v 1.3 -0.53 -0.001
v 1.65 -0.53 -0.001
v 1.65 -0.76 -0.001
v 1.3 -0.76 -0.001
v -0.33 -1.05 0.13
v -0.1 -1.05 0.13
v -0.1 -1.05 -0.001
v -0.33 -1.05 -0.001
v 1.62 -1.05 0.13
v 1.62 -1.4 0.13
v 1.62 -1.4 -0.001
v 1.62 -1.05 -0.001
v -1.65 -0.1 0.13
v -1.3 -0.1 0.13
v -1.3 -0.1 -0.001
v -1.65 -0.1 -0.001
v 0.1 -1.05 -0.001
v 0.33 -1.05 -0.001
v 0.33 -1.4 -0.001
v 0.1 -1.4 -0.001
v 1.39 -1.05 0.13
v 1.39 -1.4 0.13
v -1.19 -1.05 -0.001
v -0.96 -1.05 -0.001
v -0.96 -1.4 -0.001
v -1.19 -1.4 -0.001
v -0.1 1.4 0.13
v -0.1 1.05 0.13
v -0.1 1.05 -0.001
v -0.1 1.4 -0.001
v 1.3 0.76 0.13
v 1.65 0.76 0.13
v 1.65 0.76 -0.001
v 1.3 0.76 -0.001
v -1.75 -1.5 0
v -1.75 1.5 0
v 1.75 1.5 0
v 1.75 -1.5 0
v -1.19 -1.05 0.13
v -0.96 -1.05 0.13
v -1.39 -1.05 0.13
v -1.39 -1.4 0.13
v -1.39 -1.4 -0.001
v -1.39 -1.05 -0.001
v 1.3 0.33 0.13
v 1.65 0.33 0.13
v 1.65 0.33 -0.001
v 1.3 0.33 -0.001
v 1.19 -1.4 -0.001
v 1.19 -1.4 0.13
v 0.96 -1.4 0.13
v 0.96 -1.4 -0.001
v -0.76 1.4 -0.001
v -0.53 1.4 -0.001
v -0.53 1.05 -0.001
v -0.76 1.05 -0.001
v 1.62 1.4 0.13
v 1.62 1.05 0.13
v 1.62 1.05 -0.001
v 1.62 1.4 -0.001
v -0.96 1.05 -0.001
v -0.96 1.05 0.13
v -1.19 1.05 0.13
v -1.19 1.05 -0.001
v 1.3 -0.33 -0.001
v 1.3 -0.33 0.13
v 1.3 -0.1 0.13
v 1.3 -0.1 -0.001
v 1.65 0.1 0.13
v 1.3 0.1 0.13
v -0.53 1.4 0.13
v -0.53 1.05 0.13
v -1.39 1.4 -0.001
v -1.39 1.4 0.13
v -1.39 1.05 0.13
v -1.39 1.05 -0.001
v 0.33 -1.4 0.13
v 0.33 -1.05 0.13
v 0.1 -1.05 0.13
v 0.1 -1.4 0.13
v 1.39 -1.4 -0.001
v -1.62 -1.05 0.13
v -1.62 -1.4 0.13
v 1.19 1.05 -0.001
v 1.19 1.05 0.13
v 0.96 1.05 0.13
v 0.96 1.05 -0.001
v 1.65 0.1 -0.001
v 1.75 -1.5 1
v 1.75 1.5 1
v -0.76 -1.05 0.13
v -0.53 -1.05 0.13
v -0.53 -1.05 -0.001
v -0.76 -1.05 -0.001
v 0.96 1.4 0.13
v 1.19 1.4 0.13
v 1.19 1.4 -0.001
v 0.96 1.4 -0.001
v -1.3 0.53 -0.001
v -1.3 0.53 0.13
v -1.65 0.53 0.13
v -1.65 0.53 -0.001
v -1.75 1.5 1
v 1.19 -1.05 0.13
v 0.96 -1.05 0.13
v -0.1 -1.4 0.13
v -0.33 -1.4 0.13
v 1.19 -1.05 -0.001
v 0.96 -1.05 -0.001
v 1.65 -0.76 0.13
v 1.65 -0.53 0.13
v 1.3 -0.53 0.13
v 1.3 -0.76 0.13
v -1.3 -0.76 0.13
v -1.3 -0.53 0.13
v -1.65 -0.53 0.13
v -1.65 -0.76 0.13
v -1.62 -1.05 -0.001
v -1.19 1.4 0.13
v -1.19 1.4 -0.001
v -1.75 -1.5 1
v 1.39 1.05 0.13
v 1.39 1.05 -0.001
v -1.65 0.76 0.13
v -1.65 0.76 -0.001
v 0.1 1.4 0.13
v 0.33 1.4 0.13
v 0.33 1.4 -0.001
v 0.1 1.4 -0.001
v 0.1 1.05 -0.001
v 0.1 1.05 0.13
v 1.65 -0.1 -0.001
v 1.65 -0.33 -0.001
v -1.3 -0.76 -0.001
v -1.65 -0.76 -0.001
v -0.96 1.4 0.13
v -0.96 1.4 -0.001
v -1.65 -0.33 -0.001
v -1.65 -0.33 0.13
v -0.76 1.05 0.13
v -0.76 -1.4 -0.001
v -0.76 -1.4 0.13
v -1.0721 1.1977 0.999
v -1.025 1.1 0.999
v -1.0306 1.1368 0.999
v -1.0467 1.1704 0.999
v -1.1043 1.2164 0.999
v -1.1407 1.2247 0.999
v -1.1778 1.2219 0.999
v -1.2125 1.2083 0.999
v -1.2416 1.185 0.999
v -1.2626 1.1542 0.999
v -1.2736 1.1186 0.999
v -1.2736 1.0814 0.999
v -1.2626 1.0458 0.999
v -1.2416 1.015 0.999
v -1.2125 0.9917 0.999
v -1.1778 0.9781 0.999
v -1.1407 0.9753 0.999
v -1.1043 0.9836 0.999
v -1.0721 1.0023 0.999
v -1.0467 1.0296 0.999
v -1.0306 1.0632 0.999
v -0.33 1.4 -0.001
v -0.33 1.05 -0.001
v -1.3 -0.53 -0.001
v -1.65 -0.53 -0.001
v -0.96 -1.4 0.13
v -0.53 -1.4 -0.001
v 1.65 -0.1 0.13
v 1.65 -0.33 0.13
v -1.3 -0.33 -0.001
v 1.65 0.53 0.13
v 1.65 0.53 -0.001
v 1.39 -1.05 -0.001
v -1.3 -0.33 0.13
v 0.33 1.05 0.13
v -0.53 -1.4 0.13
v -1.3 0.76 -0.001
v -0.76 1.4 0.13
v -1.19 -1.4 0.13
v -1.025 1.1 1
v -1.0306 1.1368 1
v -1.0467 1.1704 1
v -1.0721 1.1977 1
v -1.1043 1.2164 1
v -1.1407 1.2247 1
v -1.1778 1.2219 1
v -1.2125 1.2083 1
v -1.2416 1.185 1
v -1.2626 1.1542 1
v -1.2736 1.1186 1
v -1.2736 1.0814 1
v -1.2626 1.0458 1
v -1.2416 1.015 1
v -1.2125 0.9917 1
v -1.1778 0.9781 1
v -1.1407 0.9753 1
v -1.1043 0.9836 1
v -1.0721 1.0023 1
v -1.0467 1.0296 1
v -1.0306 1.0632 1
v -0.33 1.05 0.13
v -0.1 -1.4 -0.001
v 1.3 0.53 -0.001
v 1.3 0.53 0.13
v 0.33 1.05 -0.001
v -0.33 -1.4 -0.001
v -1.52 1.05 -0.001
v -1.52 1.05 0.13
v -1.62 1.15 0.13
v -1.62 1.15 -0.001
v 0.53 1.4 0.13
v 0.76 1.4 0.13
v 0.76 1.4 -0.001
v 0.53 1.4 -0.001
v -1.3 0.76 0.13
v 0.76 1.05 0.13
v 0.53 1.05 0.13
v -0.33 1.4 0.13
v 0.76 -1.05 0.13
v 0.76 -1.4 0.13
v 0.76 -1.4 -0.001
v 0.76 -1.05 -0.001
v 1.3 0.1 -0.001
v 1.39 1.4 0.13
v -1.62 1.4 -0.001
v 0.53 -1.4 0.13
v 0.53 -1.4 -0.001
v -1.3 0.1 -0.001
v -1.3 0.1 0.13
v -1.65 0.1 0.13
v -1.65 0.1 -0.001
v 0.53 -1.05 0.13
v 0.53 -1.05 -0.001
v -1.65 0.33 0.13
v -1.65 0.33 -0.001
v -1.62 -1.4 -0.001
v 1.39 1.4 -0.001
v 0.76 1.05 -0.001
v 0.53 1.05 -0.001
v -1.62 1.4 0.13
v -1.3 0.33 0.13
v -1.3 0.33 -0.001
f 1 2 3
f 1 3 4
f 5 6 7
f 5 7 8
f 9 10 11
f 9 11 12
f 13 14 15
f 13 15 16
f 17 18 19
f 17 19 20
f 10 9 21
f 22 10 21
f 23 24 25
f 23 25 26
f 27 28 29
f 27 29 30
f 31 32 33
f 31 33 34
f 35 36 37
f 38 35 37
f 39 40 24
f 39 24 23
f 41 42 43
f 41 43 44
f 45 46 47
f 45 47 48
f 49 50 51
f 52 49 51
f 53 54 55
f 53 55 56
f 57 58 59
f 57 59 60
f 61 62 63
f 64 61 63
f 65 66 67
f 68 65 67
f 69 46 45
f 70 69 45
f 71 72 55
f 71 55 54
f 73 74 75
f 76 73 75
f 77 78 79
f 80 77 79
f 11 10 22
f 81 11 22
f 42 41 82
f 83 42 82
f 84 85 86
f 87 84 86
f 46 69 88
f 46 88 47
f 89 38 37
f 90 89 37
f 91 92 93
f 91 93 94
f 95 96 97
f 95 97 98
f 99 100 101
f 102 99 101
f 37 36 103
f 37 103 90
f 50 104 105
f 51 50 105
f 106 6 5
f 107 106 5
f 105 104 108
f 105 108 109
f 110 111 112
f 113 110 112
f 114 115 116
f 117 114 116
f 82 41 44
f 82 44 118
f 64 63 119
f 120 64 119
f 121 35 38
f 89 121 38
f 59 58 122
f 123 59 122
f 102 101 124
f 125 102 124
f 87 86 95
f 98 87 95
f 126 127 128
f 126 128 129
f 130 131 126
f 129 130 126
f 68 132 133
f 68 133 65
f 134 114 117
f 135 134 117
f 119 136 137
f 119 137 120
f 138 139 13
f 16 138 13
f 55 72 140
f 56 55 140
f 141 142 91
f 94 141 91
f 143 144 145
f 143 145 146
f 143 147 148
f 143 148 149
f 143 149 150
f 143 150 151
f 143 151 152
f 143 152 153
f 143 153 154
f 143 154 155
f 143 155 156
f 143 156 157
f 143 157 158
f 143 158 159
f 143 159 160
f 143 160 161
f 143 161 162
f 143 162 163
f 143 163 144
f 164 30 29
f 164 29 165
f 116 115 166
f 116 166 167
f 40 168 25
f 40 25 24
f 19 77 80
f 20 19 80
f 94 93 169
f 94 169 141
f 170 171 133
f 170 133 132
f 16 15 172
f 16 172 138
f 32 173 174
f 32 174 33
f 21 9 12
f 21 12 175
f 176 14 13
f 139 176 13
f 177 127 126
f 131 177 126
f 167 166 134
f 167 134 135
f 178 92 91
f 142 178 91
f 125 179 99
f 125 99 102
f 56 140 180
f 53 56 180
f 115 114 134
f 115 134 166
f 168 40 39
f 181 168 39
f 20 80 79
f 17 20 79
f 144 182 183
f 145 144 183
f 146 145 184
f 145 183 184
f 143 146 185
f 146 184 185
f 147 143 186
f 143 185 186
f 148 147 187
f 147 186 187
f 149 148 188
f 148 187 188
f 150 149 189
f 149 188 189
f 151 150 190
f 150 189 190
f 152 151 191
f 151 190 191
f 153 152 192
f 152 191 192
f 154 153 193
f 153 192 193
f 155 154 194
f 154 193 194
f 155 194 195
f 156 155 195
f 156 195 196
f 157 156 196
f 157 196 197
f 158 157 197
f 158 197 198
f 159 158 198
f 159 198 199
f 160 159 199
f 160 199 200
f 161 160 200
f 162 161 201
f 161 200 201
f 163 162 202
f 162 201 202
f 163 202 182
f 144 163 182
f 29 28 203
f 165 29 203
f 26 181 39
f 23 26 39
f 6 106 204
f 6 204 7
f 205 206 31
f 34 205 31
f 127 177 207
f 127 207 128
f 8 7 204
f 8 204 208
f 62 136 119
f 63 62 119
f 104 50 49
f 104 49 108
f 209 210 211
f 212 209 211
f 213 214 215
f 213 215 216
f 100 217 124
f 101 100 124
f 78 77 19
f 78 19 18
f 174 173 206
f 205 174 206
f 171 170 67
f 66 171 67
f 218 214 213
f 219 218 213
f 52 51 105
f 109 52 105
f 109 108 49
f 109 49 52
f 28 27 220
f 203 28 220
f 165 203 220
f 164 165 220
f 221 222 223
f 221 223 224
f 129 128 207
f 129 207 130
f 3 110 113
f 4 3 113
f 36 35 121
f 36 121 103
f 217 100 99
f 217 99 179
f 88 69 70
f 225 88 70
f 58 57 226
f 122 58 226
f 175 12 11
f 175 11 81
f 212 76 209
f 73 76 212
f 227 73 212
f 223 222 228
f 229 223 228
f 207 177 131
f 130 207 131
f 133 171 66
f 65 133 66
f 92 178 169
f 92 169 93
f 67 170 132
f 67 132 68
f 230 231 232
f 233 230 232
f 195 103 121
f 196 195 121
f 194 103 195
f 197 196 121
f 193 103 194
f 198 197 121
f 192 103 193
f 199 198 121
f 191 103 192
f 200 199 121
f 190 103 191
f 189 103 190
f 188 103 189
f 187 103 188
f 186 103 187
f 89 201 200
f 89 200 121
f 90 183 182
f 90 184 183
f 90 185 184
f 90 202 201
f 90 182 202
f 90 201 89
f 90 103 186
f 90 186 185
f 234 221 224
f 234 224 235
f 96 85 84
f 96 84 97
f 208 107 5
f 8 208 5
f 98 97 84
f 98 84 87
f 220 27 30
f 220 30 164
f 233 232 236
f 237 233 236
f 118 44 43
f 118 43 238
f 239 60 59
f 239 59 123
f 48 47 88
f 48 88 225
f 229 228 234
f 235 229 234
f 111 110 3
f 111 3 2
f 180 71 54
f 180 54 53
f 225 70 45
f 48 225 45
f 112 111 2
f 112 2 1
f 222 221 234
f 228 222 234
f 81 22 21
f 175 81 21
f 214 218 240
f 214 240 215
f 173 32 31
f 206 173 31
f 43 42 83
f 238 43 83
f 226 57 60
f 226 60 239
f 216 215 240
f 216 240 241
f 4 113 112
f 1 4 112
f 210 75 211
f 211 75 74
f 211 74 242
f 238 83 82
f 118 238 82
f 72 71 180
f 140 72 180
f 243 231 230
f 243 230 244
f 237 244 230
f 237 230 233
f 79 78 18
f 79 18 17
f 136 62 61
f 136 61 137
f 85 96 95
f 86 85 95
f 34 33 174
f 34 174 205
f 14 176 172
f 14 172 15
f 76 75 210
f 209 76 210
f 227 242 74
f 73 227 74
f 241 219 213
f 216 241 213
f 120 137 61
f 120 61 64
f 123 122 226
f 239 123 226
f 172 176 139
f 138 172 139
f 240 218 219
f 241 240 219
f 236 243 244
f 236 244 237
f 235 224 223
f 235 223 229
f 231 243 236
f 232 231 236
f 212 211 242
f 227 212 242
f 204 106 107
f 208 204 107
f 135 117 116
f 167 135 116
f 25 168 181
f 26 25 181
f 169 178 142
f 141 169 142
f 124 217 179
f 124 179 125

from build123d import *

# Parameters (mm, degrees)
SKETCH1_W                   = 3.5
SKETCH1_H                   = 3
BOSS_EXTRUDE1_DEPTH         = 1
BOSS_EXTRUDE2_DEPTH         = 0.001
BOSS_EXTRUDE2_DEPTH_BACK    = 0.13
SKETCH2_W                   = 0.23
SKETCH2_H                   = 0.35
BOSS_EXTRUDE2_2_DEPTH       = 0.001
BOSS_EXTRUDE2_2_DEPTH_BACK  = 0.13
BOSS_EXTRUDE2_3_DEPTH       = 0.001
BOSS_EXTRUDE2_3_DEPTH_BACK  = 0.13
BOSS_EXTRUDE2_4_DEPTH       = 0.001
BOSS_EXTRUDE2_4_DEPTH_BACK  = 0.13
BOSS_EXTRUDE2_5_DEPTH       = 0.001
BOSS_EXTRUDE2_5_DEPTH_BACK  = 0.13
BOSS_EXTRUDE2_6_DEPTH       = 0.001
BOSS_EXTRUDE2_6_DEPTH_BACK  = 0.13
BOSS_EXTRUDE2_7_DEPTH       = 0.001
BOSS_EXTRUDE2_7_DEPTH_BACK  = 0.13
BOSS_EXTRUDE2_8_DEPTH       = 0.001
BOSS_EXTRUDE2_8_DEPTH_BACK  = 0.13
BOSS_EXTRUDE2_9_DEPTH       = 0.001
BOSS_EXTRUDE2_9_DEPTH_BACK  = 0.13
BOSS_EXTRUDE2_10_DEPTH      = 0.001
BOSS_EXTRUDE2_10_DEPTH_BACK = 0.13
BOSS_EXTRUDE2_11_DEPTH      = 0.001
BOSS_EXTRUDE2_11_DEPTH_BACK = 0.13
BOSS_EXTRUDE2_12_DEPTH      = 0.001
BOSS_EXTRUDE2_12_DEPTH_BACK = 0.13
BOSS_EXTRUDE2_13_DEPTH      = 0.001
BOSS_EXTRUDE2_13_DEPTH_BACK = 0.13
BOSS_EXTRUDE2_14_DEPTH      = 0.001
BOSS_EXTRUDE2_14_DEPTH_BACK = 0.13
BOSS_EXTRUDE2_15_DEPTH      = 0.001
BOSS_EXTRUDE2_15_DEPTH_BACK = 0.13
BOSS_EXTRUDE2_16_DEPTH      = 0.001
BOSS_EXTRUDE2_16_DEPTH_BACK = 0.13
BOSS_EXTRUDE2_17_DEPTH      = 0.001
BOSS_EXTRUDE2_17_DEPTH_BACK = 0.13
SKETCH2_W_2                 = 0.35
SKETCH2_H_2                 = 0.23
BOSS_EXTRUDE2_18_DEPTH      = 0.001
BOSS_EXTRUDE2_18_DEPTH_BACK = 0.13
BOSS_EXTRUDE2_19_DEPTH      = 0.001
BOSS_EXTRUDE2_19_DEPTH_BACK = 0.13
BOSS_EXTRUDE2_20_DEPTH      = 0.001
BOSS_EXTRUDE2_20_DEPTH_BACK = 0.13
BOSS_EXTRUDE2_21_DEPTH      = 0.001
BOSS_EXTRUDE2_21_DEPTH_BACK = 0.13
BOSS_EXTRUDE2_22_DEPTH      = 0.001
BOSS_EXTRUDE2_22_DEPTH_BACK = 0.13
BOSS_EXTRUDE2_23_DEPTH      = 0.001
BOSS_EXTRUDE2_23_DEPTH_BACK = 0.13
BOSS_EXTRUDE2_24_DEPTH      = 0.001
BOSS_EXTRUDE2_24_DEPTH_BACK = 0.13
SKETCH3_R                   = 0.125
CUT_EXTRUDE1_DEPTH          = 0.001


with BuildPart() as part:
    # Sketch1 → Boss-Extrude1 (new body)
    with BuildSketch(Plane.XY):
        Rectangle(SKETCH1_W, SKETCH1_H)
    extrude(amount=BOSS_EXTRUDE1_DEPTH)

    # Sketch3 → Cut-Extrude1 (cut)
    with BuildSketch(Plane.XY.offset(1)):
        with Locations((-1.15, 1.1)):
            Circle(SKETCH3_R)
    extrude(amount=-CUT_EXTRUDE1_DEPTH, mode=Mode.SUBTRACT)


with BuildPart() as body_2:
    # Sketch2 → Boss-Extrude2 (new, two sides: drawn at the far end of the back side and taken through both)
    with BuildSketch(Plane(origin=(0, 0, 0), x_dir=(-1, 0, 0), z_dir=(0, 0, -1)).offset(-BOSS_EXTRUDE2_DEPTH_BACK)):
        with Locations((-0.215, 1.225)):
            Rectangle(SKETCH2_W, SKETCH2_H)
    extrude(amount=BOSS_EXTRUDE2_DEPTH + BOSS_EXTRUDE2_DEPTH_BACK)


with BuildPart() as body_3:
    # Sketch2 → Boss-Extrude2 2 (new, two sides: drawn at the far end of the back side and taken through both)
    with BuildSketch(Plane(origin=(0, 0, 0), x_dir=(-1, 0, 0), z_dir=(0, 0, -1)).offset(-BOSS_EXTRUDE2_2_DEPTH_BACK)):
        with Locations((-0.645, 1.225)):
            Rectangle(SKETCH2_W, SKETCH2_H)
    extrude(amount=BOSS_EXTRUDE2_2_DEPTH + BOSS_EXTRUDE2_2_DEPTH_BACK)


with BuildPart() as body_4:
    # Sketch2 → Boss-Extrude2 3 (new, two sides: drawn at the far end of the back side and taken through both)
    with BuildSketch(Plane(origin=(0, 0, 0), x_dir=(-1, 0, 0), z_dir=(0, 0, -1)).offset(-BOSS_EXTRUDE2_3_DEPTH_BACK)):
        with Locations((-1.075, 1.225)):
            Rectangle(SKETCH2_W, SKETCH2_H)
    extrude(amount=BOSS_EXTRUDE2_3_DEPTH + BOSS_EXTRUDE2_3_DEPTH_BACK)


with BuildPart() as body_5:
    # Sketch2 → Boss-Extrude2 4 (new, two sides: drawn at the far end of the back side and taken through both)
    with BuildSketch(Plane(origin=(0, 0, 0), x_dir=(-1, 0, 0), z_dir=(0, 0, -1)).offset(-BOSS_EXTRUDE2_4_DEPTH_BACK)):
        with Locations((-1.505, 1.225)):
            Rectangle(SKETCH2_W, SKETCH2_H)
    extrude(amount=BOSS_EXTRUDE2_4_DEPTH + BOSS_EXTRUDE2_4_DEPTH_BACK)


with BuildPart() as body_6:
    # Sketch2 → Boss-Extrude2 5 (new, two sides: drawn at the far end of the back side and taken through both)
    with BuildSketch(Plane(origin=(0, 0, 0), x_dir=(-1, 0, 0), z_dir=(0, 0, -1)).offset(-BOSS_EXTRUDE2_5_DEPTH_BACK)):
        with Locations((0.215, 1.225)):
            Rectangle(SKETCH2_W, SKETCH2_H)
    extrude(amount=BOSS_EXTRUDE2_5_DEPTH + BOSS_EXTRUDE2_5_DEPTH_BACK)


with BuildPart() as body_7:
    # Sketch2 → Boss-Extrude2 6 (new, two sides: drawn at the far end of the back side and taken through both)
    with BuildSketch(Plane(origin=(0, 0, 0), x_dir=(-1, 0, 0), z_dir=(0, 0, -1)).offset(-BOSS_EXTRUDE2_6_DEPTH_BACK)):
        with Locations((0.645, 1.225)):
            Rectangle(SKETCH2_W, SKETCH2_H)
    extrude(amount=BOSS_EXTRUDE2_6_DEPTH + BOSS_EXTRUDE2_6_DEPTH_BACK)


with BuildPart() as body_8:
    # Sketch2 → Boss-Extrude2 7 (new, two sides: drawn at the far end of the back side and taken through both)
    with BuildSketch(Plane(origin=(0, 0, 0), x_dir=(-1, 0, 0), z_dir=(0, 0, -1)).offset(-BOSS_EXTRUDE2_7_DEPTH_BACK)):
        with Locations((1.075, 1.225)):
            Rectangle(SKETCH2_W, SKETCH2_H)
    extrude(amount=BOSS_EXTRUDE2_7_DEPTH + BOSS_EXTRUDE2_7_DEPTH_BACK)


with BuildPart() as body_9:
    # Sketch2 → Boss-Extrude2 8 (new, two sides: drawn at the far end of the back side and taken through both)
    with BuildSketch(Plane(origin=(0, 0, 0), x_dir=(-1, 0, 0), z_dir=(0, 0, -1)).offset(-BOSS_EXTRUDE2_8_DEPTH_BACK)):
        Polygon((1.62, 1.4), (1.39, 1.4), (1.39, 1.05), (1.52, 1.05), (1.62, 1.15), align=None)
    extrude(amount=BOSS_EXTRUDE2_8_DEPTH + BOSS_EXTRUDE2_8_DEPTH_BACK)


with BuildPart() as body_10:
    # Sketch2 → Boss-Extrude2 9 (new, two sides: drawn at the far end of the back side and taken through both)
    with BuildSketch(Plane(origin=(0, 0, 0), x_dir=(-1, 0, 0), z_dir=(0, 0, -1)).offset(-BOSS_EXTRUDE2_9_DEPTH_BACK)):
        with Locations((1.505, -1.225)):
            Rectangle(SKETCH2_W, SKETCH2_H)
    extrude(amount=BOSS_EXTRUDE2_9_DEPTH + BOSS_EXTRUDE2_9_DEPTH_BACK)


with BuildPart() as body_11:
    # Sketch2 → Boss-Extrude2 10 (new, two sides: drawn at the far end of the back side and taken through both)
    with BuildSketch(Plane(origin=(0, 0, 0), x_dir=(-1, 0, 0), z_dir=(0, 0, -1)).offset(-BOSS_EXTRUDE2_10_DEPTH_BACK)):
        with Locations((1.075, -1.225)):
            Rectangle(SKETCH2_W, SKETCH2_H)
    extrude(amount=BOSS_EXTRUDE2_10_DEPTH + BOSS_EXTRUDE2_10_DEPTH_BACK)


with BuildPart() as body_12:
    # Sketch2 → Boss-Extrude2 11 (new, two sides: drawn at the far end of the back side and taken through both)
    with BuildSketch(Plane(origin=(0, 0, 0), x_dir=(-1, 0, 0), z_dir=(0, 0, -1)).offset(-BOSS_EXTRUDE2_11_DEPTH_BACK)):
        with Locations((0.645, -1.225)):
            Rectangle(SKETCH2_W, SKETCH2_H)
    extrude(amount=BOSS_EXTRUDE2_11_DEPTH + BOSS_EXTRUDE2_11_DEPTH_BACK)


with BuildPart() as body_13:
    # Sketch2 → Boss-Extrude2 12 (new, two sides: drawn at the far end of the back side and taken through both)
    with BuildSketch(Plane(origin=(0, 0, 0), x_dir=(-1, 0, 0), z_dir=(0, 0, -1)).offset(-BOSS_EXTRUDE2_12_DEPTH_BACK)):
        with Locations((0.215, -1.225)):
            Rectangle(SKETCH2_W, SKETCH2_H)
    extrude(amount=BOSS_EXTRUDE2_12_DEPTH + BOSS_EXTRUDE2_12_DEPTH_BACK)


with BuildPart() as body_14:
    # Sketch2 → Boss-Extrude2 13 (new, two sides: drawn at the far end of the back side and taken through both)
    with BuildSketch(Plane(origin=(0, 0, 0), x_dir=(-1, 0, 0), z_dir=(0, 0, -1)).offset(-BOSS_EXTRUDE2_13_DEPTH_BACK)):
        with Locations((-0.215, -1.225)):
            Rectangle(SKETCH2_W, SKETCH2_H)
    extrude(amount=BOSS_EXTRUDE2_13_DEPTH + BOSS_EXTRUDE2_13_DEPTH_BACK)


with BuildPart() as body_15:
    # Sketch2 → Boss-Extrude2 14 (new, two sides: drawn at the far end of the back side and taken through both)
    with BuildSketch(Plane(origin=(0, 0, 0), x_dir=(-1, 0, 0), z_dir=(0, 0, -1)).offset(-BOSS_EXTRUDE2_14_DEPTH_BACK)):
        with Locations((-0.645, -1.225)):
            Rectangle(SKETCH2_W, SKETCH2_H)
    extrude(amount=BOSS_EXTRUDE2_14_DEPTH + BOSS_EXTRUDE2_14_DEPTH_BACK)


with BuildPart() as body_16:
    # Sketch2 → Boss-Extrude2 15 (new, two sides: drawn at the far end of the back side and taken through both)
    with BuildSketch(Plane(origin=(0, 0, 0), x_dir=(-1, 0, 0), z_dir=(0, 0, -1)).offset(-BOSS_EXTRUDE2_15_DEPTH_BACK)):
        with Locations((-1.075, -1.225)):
            Rectangle(SKETCH2_W, SKETCH2_H)
    extrude(amount=BOSS_EXTRUDE2_15_DEPTH + BOSS_EXTRUDE2_15_DEPTH_BACK)


with BuildPart() as body_17:
    # Sketch2 → Boss-Extrude2 16 (new, two sides: drawn at the far end of the back side and taken through both)
    with BuildSketch(Plane(origin=(0, 0, 0), x_dir=(-1, 0, 0), z_dir=(0, 0, -1)).offset(-BOSS_EXTRUDE2_16_DEPTH_BACK)):
        with Locations((-1.505, -1.225)):
            Rectangle(SKETCH2_W, SKETCH2_H)
    extrude(amount=BOSS_EXTRUDE2_16_DEPTH + BOSS_EXTRUDE2_16_DEPTH_BACK)


with BuildPart() as body_18:
    # Sketch2 → Boss-Extrude2 17 (new, two sides: drawn at the far end of the back side and taken through both)
    with BuildSketch(Plane(origin=(0, 0, 0), x_dir=(-1, 0, 0), z_dir=(0, 0, -1)).offset(-BOSS_EXTRUDE2_17_DEPTH_BACK)):
        with Locations((-1.475, 0.215)):
            Rectangle(SKETCH2_W_2, SKETCH2_H_2)
    extrude(amount=BOSS_EXTRUDE2_17_DEPTH + BOSS_EXTRUDE2_17_DEPTH_BACK)


with BuildPart() as body_19:
    # Sketch2 → Boss-Extrude2 18 (new, two sides: drawn at the far end of the back side and taken through both)
    with BuildSketch(Plane(origin=(0, 0, 0), x_dir=(-1, 0, 0), z_dir=(0, 0, -1)).offset(-BOSS_EXTRUDE2_18_DEPTH_BACK)):
        with Locations((-1.475, 0.645)):
            Rectangle(SKETCH2_W_2, SKETCH2_H_2)
    extrude(amount=BOSS_EXTRUDE2_18_DEPTH + BOSS_EXTRUDE2_18_DEPTH_BACK)


with BuildPart() as body_20:
    # Sketch2 → Boss-Extrude2 19 (new, two sides: drawn at the far end of the back side and taken through both)
    with BuildSketch(Plane(origin=(0, 0, 0), x_dir=(-1, 0, 0), z_dir=(0, 0, -1)).offset(-BOSS_EXTRUDE2_19_DEPTH_BACK)):
        with Locations((-1.475, -0.215)):
            Rectangle(SKETCH2_W_2, SKETCH2_H_2)
    extrude(amount=BOSS_EXTRUDE2_19_DEPTH + BOSS_EXTRUDE2_19_DEPTH_BACK)


with BuildPart() as body_21:
    # Sketch2 → Boss-Extrude2 20 (new, two sides: drawn at the far end of the back side and taken through both)
    with BuildSketch(Plane(origin=(0, 0, 0), x_dir=(-1, 0, 0), z_dir=(0, 0, -1)).offset(-BOSS_EXTRUDE2_20_DEPTH_BACK)):
        with Locations((-1.475, -0.645)):
            Rectangle(SKETCH2_W_2, SKETCH2_H_2)
    extrude(amount=BOSS_EXTRUDE2_20_DEPTH + BOSS_EXTRUDE2_20_DEPTH_BACK)


with BuildPart() as body_22:
    # Sketch2 → Boss-Extrude2 21 (new, two sides: drawn at the far end of the back side and taken through both)
    with BuildSketch(Plane(origin=(0, 0, 0), x_dir=(-1, 0, 0), z_dir=(0, 0, -1)).offset(-BOSS_EXTRUDE2_21_DEPTH_BACK)):
        with Locations((1.475, -0.645)):
            Rectangle(SKETCH2_W_2, SKETCH2_H_2)
    extrude(amount=BOSS_EXTRUDE2_21_DEPTH + BOSS_EXTRUDE2_21_DEPTH_BACK)


with BuildPart() as body_23:
    # Sketch2 → Boss-Extrude2 22 (new, two sides: drawn at the far end of the back side and taken through both)
    with BuildSketch(Plane(origin=(0, 0, 0), x_dir=(-1, 0, 0), z_dir=(0, 0, -1)).offset(-BOSS_EXTRUDE2_22_DEPTH_BACK)):
        with Locations((1.475, -0.215)):
            Rectangle(SKETCH2_W_2, SKETCH2_H_2)
    extrude(amount=BOSS_EXTRUDE2_22_DEPTH + BOSS_EXTRUDE2_22_DEPTH_BACK)


with BuildPart() as body_24:
    # Sketch2 → Boss-Extrude2 23 (new, two sides: drawn at the far end of the back side and taken through both)
    with BuildSketch(Plane(origin=(0, 0, 0), x_dir=(-1, 0, 0), z_dir=(0, 0, -1)).offset(-BOSS_EXTRUDE2_23_DEPTH_BACK)):
        with Locations((1.475, 0.215)):
            Rectangle(SKETCH2_W_2, SKETCH2_H_2)
    extrude(amount=BOSS_EXTRUDE2_23_DEPTH + BOSS_EXTRUDE2_23_DEPTH_BACK)


with BuildPart() as body_25:
    # Sketch2 → Boss-Extrude2 24 (new, two sides: drawn at the far end of the back side and taken through both)
    with BuildSketch(Plane(origin=(0, 0, 0), x_dir=(-1, 0, 0), z_dir=(0, 0, -1)).offset(-BOSS_EXTRUDE2_24_DEPTH_BACK)):
        with Locations((1.475, 0.645)):
            Rectangle(SKETCH2_W_2, SKETCH2_H_2)
    extrude(amount=BOSS_EXTRUDE2_24_DEPTH + BOSS_EXTRUDE2_24_DEPTH_BACK)


solid = Compound([part.part, body_2.part, body_3.part, body_4.part, body_5.part, body_6.part, body_7.part, body_8.part, body_9.part, body_10.part, body_11.part, body_12.part, body_13.part, body_14.part, body_15.part, body_16.part, body_17.part, body_18.part, body_19.part, body_20.part, body_21.part, body_22.part, body_23.part, body_24.part, body_25.part])
